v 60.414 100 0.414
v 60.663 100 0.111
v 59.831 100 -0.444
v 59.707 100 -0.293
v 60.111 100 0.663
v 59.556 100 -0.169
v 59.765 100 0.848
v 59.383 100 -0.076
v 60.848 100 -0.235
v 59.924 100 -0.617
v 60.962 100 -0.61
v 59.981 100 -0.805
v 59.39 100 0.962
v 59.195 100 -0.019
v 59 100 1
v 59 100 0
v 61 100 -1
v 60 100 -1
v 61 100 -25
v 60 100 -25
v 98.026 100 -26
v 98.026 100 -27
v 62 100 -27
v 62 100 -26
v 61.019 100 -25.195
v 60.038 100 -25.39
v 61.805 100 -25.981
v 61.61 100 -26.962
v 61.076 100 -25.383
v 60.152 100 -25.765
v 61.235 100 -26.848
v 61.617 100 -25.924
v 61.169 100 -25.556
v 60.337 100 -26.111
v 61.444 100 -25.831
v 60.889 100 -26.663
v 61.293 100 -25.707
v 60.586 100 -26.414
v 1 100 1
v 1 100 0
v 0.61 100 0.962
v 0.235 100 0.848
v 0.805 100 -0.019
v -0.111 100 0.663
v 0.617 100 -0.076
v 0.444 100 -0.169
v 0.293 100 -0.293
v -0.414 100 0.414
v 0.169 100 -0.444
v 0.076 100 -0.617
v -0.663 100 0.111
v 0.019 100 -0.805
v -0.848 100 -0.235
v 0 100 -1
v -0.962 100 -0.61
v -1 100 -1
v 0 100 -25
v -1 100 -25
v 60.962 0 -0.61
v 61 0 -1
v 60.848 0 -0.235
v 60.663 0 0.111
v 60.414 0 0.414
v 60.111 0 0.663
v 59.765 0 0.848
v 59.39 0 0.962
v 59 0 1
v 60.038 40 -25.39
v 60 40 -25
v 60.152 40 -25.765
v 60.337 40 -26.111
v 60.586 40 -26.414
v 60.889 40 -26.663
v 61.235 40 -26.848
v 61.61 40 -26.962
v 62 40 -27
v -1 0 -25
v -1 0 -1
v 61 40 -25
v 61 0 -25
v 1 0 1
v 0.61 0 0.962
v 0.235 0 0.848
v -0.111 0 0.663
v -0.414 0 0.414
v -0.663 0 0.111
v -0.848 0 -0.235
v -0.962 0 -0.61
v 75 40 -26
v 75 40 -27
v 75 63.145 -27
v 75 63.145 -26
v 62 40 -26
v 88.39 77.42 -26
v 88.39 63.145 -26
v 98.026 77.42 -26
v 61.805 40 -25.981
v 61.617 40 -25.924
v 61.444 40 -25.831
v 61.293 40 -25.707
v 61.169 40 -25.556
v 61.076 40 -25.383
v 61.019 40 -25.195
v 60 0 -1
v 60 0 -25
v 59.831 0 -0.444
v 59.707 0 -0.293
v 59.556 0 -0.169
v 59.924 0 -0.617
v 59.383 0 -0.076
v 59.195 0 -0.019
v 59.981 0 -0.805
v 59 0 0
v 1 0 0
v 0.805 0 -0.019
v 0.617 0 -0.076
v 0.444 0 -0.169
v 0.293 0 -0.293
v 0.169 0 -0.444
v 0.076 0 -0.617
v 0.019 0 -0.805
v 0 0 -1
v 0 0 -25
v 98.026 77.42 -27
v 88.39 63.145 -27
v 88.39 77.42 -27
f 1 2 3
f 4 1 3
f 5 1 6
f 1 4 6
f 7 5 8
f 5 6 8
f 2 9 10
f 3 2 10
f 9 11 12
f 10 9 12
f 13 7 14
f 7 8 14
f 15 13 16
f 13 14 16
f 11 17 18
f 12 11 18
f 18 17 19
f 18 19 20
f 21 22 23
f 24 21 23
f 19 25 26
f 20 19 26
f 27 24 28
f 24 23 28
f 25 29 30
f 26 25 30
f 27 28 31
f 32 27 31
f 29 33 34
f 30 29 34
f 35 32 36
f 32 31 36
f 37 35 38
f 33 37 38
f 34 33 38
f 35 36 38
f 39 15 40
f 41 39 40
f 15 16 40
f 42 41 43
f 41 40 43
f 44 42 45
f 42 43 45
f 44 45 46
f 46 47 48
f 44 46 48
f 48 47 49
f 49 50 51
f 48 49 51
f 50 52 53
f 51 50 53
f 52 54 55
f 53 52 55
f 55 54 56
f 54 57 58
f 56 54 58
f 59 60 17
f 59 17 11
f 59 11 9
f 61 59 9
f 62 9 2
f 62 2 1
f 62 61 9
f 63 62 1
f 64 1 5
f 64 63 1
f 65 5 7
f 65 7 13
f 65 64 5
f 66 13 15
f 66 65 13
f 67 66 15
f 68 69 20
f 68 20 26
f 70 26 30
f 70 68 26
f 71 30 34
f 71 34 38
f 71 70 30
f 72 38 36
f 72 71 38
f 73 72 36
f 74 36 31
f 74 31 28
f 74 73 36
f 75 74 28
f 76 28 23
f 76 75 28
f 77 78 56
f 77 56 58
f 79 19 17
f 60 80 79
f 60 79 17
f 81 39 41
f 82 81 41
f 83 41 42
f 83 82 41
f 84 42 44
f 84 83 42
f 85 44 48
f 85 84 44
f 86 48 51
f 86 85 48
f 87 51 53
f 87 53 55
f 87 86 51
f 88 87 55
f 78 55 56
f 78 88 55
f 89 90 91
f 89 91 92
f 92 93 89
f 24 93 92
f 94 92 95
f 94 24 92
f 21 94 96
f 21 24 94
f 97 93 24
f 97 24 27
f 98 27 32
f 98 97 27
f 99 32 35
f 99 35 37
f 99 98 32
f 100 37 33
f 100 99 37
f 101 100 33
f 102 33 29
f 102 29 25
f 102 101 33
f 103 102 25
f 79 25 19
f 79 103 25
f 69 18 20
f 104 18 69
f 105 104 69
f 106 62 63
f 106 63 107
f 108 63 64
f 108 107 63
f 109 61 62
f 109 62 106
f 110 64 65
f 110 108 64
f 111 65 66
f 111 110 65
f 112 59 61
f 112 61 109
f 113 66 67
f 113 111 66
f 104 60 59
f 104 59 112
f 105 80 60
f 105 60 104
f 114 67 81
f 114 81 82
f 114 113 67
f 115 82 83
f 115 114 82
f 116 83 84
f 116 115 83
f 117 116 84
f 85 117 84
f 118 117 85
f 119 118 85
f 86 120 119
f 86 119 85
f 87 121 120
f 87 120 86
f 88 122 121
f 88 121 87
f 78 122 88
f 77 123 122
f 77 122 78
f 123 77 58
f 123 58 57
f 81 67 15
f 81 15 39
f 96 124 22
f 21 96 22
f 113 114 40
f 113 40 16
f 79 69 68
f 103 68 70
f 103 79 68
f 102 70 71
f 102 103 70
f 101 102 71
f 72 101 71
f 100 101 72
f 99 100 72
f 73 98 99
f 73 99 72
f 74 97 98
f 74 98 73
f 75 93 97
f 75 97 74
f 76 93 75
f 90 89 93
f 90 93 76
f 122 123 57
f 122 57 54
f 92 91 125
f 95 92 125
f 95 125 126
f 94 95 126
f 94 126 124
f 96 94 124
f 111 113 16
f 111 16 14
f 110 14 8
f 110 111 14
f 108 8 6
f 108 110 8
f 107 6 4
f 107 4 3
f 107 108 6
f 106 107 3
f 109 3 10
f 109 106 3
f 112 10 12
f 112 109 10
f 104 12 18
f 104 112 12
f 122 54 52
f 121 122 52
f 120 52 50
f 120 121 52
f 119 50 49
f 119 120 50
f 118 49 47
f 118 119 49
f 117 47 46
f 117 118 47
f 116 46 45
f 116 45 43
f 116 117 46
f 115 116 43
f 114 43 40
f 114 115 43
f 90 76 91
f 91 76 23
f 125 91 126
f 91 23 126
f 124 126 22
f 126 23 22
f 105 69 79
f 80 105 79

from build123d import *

# Parameters (mm, degrees)
Z_KLADN_PLECH1_DEPTH = 100
LEM_Z_HRANY1_DEPTH   = 60
OU_KO1_DEPTH         = 1


# Sheet-metal steps are written as plain solids
with BuildPart() as part:
    # Skica1 → Základní plech1 (new body)
    with BuildSketch(Plane(origin=(0, 0, 0), x_dir=(1, 0, 0), z_dir=(0, 1, 0))):
        with BuildLine():
            Line((0, 25), (0, 1))
            ThreePointArc((0, 1), (0.292893219, 0.292893219), (1, 0))
            Line((1, 0), (59, 0))
            ThreePointArc((59, 0), (59.707106781, 0.292893219), (60, 1))
            Line((60, 1), (60, 25))
            Line((60, 25), (61, 25))
            Line((61, 25), (61, 1))
            ThreePointArc((61, 1), (60.414213562, -0.414213562), (59, -1))
            Line((59, -1), (1, -1))
            ThreePointArc((1, -1), (-0.414213562, -0.414213562), (-1, 1))
            Line((-1, 1), (-1, 25))
            Line((-1, 25), (0, 25))
        make_face()
    extrude(amount=Z_KLADN_PLECH1_DEPTH)

    # Lem z hrany1 section (across the edge) → Lem z hrany1 (add)
    with BuildSketch(Plane(origin=(61, 40, -26), x_dir=(0, 0, 1), z_dir=(0, 1, 0))):
        with BuildLine():
            Line((-1, 1), (-1, 14))
            Line((-1, 14), (0, 14))
            Line((0, 14), (0, 1))
            ThreePointArc((0, 1), (0.292893219, 0.292893219), (1, 0))
            Line((1, 0), (1, -1))
            ThreePointArc((1, -1), (-0.414213562, -0.414213562), (-1, 1))
        make_face()
    extrude(amount=LEM_Z_HRANY1_DEPTH)

    # Skica9 → Ouško1 (add)
    with BuildSketch(Plane(origin=(0, 0, -27), x_dir=(-1, 0, 0), z_dir=(0, 0, -1))):
        Polygon((-98.025768087, 100), (-75, 100), (-75, 63.144926654), (-88.390120494, 63.144926654), (-88.390120494, 77.419960125), (-98.025768087, 77.419960125), align=None)
    extrude(amount=-OU_KO1_DEPTH)


solid = part.part
